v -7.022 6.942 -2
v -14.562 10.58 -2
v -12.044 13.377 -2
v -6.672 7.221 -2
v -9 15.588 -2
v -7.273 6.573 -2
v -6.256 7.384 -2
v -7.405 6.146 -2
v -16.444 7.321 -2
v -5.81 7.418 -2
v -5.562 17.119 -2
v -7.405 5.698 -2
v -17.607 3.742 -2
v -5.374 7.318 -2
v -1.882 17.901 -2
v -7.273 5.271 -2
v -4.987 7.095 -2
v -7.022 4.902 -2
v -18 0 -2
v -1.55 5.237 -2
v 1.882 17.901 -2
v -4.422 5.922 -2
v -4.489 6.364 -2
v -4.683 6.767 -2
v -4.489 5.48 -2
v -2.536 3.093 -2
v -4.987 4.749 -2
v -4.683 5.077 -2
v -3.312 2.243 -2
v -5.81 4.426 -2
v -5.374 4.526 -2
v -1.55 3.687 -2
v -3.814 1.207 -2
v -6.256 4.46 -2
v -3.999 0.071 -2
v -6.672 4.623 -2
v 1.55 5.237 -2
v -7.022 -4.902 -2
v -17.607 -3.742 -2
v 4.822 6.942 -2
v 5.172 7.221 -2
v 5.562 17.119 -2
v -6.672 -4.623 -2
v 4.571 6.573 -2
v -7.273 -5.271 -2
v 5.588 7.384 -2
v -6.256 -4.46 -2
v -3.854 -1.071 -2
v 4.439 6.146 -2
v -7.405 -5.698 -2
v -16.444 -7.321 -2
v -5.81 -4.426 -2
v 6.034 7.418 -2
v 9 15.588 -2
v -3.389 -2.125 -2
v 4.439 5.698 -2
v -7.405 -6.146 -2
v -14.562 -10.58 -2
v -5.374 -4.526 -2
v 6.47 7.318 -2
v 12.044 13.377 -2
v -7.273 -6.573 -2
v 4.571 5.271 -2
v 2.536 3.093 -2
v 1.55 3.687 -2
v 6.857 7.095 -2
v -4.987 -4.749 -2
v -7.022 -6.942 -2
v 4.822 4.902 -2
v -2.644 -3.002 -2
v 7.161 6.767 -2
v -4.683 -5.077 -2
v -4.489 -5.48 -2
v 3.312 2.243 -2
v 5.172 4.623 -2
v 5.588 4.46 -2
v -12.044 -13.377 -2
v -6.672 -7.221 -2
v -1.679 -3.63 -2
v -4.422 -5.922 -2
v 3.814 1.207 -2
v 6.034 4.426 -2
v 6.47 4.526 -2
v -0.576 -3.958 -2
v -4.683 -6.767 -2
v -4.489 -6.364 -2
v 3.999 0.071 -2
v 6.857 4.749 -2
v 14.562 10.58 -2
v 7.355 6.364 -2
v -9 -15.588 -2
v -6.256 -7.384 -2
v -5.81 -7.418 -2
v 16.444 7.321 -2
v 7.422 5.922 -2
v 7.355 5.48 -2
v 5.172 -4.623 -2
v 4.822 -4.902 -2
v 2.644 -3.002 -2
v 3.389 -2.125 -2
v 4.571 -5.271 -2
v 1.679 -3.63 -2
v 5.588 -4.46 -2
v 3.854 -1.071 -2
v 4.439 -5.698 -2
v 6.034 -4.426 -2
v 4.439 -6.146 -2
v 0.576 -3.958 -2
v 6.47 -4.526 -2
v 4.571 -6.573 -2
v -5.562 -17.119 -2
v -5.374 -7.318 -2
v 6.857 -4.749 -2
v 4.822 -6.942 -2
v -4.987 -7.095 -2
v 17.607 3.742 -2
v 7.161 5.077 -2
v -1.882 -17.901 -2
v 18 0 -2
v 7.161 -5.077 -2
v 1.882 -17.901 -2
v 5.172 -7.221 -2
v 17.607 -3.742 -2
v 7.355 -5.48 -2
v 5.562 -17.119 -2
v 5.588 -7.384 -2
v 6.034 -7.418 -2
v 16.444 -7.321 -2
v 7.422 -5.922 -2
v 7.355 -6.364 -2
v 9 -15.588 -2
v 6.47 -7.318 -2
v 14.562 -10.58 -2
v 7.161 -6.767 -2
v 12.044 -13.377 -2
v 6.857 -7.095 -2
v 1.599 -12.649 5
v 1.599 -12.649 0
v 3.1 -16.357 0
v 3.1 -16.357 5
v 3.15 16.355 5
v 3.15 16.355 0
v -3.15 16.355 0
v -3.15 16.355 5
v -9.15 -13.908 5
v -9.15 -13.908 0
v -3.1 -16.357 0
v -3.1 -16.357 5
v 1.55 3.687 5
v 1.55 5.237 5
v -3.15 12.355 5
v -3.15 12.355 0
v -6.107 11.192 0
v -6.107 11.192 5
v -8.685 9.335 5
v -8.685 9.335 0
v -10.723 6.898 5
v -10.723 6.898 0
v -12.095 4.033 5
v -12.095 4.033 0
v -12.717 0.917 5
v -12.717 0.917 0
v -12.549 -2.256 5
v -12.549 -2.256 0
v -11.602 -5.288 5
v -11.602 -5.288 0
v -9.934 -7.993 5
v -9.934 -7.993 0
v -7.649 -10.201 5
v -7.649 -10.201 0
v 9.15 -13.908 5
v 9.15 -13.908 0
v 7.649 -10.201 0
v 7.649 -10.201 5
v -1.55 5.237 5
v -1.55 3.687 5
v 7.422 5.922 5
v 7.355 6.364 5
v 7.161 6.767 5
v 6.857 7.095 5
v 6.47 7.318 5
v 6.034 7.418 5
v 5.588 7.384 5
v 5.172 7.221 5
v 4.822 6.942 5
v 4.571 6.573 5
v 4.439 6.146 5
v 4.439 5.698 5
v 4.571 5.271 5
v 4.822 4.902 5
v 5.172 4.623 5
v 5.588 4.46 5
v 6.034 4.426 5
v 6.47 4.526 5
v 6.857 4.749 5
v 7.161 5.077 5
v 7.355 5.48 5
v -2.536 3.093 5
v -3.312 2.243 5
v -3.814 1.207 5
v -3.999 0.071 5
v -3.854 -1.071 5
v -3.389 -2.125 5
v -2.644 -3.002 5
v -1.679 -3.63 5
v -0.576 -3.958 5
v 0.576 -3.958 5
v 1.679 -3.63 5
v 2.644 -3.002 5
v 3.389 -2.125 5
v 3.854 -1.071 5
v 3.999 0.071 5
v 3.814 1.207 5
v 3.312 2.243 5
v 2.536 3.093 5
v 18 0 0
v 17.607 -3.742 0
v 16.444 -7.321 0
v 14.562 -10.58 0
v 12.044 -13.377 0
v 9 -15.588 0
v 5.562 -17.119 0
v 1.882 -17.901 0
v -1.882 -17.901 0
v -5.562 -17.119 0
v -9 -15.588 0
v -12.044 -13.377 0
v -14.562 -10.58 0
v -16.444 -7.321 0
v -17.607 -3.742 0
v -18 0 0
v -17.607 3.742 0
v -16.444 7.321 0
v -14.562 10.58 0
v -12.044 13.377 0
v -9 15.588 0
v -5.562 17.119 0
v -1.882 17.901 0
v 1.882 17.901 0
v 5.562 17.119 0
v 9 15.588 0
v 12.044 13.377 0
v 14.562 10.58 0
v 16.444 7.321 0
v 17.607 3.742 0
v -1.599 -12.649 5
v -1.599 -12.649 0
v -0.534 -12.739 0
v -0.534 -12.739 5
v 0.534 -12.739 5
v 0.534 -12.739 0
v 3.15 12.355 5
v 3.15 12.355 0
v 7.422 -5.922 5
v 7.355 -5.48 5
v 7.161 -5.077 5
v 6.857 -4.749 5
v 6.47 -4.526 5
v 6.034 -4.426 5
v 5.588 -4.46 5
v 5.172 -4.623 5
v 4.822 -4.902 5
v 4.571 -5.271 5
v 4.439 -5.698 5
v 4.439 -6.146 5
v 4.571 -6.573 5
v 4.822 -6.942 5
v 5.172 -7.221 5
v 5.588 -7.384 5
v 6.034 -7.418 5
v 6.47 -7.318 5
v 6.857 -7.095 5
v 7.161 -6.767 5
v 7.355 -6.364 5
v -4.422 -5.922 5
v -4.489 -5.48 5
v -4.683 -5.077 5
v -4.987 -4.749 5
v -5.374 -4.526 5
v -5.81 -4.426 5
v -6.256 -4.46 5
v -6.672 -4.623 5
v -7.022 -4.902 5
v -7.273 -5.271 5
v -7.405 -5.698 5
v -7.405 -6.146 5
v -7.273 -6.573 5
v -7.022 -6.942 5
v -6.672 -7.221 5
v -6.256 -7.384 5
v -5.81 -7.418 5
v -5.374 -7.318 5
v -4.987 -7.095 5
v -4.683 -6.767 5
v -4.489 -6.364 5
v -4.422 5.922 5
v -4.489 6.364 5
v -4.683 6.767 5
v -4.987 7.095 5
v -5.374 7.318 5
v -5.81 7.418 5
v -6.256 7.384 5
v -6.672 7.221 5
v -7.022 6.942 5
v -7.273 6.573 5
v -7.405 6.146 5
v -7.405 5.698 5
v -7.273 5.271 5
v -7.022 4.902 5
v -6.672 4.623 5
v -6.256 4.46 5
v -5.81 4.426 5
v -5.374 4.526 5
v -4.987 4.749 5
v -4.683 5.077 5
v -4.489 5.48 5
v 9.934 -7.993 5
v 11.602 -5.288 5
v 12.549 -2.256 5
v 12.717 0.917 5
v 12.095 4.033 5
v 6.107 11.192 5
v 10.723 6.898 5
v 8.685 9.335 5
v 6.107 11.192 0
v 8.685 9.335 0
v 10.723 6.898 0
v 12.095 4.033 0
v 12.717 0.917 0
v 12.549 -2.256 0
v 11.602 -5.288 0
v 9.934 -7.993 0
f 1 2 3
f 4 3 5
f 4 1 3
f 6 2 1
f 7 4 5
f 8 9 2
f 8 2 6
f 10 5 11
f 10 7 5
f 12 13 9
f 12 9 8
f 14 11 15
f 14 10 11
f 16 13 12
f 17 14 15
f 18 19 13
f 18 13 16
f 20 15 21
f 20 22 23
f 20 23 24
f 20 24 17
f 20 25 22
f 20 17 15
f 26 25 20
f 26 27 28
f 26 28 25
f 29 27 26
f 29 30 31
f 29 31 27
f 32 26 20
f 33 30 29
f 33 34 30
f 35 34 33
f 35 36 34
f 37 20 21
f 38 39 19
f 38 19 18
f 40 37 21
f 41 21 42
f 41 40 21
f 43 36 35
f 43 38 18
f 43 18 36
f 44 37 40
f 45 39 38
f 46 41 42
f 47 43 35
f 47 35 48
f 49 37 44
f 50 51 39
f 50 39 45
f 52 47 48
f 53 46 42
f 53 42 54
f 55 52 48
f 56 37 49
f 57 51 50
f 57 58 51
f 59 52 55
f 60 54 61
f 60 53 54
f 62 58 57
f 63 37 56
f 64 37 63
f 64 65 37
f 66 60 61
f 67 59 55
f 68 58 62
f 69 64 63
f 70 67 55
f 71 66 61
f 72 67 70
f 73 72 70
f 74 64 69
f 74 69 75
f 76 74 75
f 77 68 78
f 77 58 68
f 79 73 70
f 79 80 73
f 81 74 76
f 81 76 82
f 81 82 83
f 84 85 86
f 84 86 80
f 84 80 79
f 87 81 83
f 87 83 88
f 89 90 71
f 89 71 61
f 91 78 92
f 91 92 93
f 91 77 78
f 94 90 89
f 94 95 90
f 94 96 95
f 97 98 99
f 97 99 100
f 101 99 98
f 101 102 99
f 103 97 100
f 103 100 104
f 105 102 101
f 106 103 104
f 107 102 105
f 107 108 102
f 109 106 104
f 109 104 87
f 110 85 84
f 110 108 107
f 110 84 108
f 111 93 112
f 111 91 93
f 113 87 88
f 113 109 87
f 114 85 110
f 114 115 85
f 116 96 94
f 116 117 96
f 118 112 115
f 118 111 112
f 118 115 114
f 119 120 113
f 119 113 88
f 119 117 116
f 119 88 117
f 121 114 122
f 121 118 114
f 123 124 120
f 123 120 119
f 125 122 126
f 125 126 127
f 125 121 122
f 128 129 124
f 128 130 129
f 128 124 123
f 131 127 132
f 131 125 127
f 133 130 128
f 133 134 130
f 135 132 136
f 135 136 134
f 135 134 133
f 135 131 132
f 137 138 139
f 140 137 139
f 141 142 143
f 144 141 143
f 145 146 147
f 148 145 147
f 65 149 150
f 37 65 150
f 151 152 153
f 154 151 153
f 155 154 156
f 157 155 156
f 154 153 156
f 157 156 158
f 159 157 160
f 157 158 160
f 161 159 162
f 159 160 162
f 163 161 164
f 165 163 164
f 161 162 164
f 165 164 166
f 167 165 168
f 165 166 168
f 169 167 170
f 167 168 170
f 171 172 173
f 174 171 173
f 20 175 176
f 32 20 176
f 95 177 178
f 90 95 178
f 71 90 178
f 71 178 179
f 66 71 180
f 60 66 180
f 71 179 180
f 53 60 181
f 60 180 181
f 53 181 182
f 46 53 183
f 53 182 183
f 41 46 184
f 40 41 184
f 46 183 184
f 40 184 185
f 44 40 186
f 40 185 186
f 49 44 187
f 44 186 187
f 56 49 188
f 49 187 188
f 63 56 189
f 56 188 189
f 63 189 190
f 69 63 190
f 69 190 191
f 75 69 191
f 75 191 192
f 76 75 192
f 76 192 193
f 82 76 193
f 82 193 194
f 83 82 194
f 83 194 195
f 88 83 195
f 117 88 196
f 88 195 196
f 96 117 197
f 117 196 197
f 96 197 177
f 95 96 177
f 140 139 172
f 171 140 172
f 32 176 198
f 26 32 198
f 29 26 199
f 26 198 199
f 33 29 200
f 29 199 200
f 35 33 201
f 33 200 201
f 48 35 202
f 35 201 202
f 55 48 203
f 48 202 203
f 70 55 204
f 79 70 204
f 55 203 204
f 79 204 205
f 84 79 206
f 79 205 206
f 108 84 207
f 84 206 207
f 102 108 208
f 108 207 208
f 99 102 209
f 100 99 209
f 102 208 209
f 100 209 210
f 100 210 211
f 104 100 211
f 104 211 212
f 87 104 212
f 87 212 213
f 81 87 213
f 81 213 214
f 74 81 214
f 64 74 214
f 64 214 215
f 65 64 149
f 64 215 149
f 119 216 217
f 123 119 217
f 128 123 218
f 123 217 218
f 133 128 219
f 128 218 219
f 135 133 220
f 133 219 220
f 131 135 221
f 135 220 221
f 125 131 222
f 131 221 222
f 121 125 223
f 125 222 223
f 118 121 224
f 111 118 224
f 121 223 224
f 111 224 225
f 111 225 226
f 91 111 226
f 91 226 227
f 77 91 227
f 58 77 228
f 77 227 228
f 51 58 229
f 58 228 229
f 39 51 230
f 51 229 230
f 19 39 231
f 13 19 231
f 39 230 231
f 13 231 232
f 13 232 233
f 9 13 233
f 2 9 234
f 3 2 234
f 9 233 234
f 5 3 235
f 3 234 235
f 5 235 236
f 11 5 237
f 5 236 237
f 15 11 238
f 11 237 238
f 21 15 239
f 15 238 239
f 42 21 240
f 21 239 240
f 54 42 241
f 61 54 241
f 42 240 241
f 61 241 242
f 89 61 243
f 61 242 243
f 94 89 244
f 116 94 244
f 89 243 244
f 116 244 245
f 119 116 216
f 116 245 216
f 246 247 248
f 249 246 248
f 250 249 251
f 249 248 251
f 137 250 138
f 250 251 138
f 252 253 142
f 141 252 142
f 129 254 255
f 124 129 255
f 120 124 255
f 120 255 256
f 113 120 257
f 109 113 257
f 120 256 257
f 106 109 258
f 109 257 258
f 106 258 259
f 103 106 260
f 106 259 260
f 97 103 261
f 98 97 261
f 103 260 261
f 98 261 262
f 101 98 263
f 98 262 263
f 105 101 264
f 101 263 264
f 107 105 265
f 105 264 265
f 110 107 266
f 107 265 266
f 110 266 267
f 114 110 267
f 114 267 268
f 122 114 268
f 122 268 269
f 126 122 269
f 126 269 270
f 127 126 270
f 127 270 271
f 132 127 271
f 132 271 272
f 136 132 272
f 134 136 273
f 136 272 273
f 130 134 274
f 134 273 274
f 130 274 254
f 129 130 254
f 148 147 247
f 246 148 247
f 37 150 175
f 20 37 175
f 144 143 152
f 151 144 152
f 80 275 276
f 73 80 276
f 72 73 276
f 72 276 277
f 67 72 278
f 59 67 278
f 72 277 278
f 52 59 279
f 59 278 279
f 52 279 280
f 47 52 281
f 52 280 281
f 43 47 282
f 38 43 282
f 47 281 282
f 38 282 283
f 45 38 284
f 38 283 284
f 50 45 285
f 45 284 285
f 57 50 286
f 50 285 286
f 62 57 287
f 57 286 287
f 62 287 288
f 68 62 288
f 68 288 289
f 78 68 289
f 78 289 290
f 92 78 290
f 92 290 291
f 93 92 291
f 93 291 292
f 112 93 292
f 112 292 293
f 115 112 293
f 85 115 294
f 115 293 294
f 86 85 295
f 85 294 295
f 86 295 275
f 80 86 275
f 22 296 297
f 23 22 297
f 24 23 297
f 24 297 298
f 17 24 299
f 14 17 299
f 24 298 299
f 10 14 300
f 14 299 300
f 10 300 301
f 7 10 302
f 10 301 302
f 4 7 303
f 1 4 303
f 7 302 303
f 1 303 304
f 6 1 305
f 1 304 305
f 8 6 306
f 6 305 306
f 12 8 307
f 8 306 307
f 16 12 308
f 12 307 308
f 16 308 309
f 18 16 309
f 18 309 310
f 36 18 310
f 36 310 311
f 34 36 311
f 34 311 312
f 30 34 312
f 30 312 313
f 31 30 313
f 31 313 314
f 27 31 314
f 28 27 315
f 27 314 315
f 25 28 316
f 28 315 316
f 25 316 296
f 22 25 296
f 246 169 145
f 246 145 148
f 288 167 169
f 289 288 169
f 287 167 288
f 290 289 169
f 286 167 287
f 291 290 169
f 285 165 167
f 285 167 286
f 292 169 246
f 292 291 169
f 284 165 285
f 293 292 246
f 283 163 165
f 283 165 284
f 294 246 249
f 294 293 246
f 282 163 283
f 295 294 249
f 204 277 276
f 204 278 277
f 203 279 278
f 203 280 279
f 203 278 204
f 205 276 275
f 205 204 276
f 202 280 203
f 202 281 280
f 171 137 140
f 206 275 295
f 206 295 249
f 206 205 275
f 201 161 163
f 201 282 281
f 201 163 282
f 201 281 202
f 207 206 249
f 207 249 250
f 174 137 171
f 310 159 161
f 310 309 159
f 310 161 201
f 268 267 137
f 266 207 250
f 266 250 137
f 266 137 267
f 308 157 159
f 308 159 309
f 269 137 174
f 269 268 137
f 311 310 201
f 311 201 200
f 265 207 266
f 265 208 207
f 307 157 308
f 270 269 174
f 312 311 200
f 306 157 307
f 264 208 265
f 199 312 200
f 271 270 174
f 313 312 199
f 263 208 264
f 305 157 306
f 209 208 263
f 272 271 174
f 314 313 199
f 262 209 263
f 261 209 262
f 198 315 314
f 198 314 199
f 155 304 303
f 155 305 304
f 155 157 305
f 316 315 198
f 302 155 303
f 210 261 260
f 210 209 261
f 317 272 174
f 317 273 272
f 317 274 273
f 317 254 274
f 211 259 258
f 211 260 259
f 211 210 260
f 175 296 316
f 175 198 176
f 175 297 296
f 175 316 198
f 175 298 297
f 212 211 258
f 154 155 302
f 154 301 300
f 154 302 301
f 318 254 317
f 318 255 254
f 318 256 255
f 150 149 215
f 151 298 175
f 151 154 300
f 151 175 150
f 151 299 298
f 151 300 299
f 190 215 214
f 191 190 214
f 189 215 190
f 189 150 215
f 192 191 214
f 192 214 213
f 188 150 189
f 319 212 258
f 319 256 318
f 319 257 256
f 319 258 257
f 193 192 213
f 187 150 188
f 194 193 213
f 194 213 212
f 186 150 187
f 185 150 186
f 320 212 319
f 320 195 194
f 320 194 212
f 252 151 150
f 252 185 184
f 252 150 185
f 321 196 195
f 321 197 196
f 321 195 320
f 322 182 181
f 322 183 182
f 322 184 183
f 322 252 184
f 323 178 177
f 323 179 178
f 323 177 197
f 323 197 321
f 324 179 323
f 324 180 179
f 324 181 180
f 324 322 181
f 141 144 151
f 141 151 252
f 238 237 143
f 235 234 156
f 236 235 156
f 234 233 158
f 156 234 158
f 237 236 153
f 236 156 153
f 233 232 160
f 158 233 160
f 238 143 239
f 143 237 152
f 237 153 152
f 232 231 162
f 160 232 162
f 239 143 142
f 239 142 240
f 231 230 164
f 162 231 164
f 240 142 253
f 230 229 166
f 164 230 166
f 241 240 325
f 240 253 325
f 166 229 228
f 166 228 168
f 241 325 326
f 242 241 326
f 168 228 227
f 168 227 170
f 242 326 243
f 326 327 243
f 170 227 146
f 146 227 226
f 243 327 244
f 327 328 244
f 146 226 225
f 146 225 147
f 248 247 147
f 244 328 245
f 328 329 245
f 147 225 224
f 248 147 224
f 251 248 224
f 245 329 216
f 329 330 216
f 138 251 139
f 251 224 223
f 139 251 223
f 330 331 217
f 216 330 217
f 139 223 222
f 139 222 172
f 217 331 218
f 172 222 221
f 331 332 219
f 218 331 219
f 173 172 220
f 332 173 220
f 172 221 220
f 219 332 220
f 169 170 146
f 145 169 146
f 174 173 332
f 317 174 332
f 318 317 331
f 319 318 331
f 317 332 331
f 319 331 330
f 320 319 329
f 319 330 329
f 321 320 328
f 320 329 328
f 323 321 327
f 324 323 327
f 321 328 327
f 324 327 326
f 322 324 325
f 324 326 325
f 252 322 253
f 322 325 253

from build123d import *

# Parameters (mm, degrees)
F1_DEPTH = 5
F2_R     = 18
F3_DEPTH = 2
F4_R     = 1.5
F5_DEPTH = 7


with BuildPart() as f1:
    # F0 (on Top) → F1 (new body)
    with BuildSketch(Plane.XY):
        with BuildLine():
            Line((9.15, -13.908354), (7.649261, -10.200554))
            ThreePointArc((7.649261, -10.200554), (12.50366, 2.49419), (3.15, 12.354756))
            Line((3.15, 12.354756), (3.15, 16.354756))
            Line((3.15, 16.354756), (0, 16.354756))
            Line((0, 16.354756), (-3.15, 16.354756))
            Line((-3.15, 16.354756), (-3.15, 12.354756))
            ThreePointArc((-3.15, 12.354756), (-12.50366, 2.49419), (-7.649261, -10.200554))
            Line((-7.649261, -10.200554), (-9.15, -13.908354))
            Line((-9.15, -13.908354), (-3.1, -16.357103))
            Line((-3.1, -16.357103), (-1.599261, -12.649303))
            ThreePointArc((-1.599261, -12.649303), (0, -12.75), (1.599261, -12.649303))
            Line((1.599261, -12.649303), (3.1, -16.357103))
            Line((3.1, -16.357103), (9.15, -13.908354))
        make_face()
    extrude(amount=F1_DEPTH)

    # F2 (on face) → F3 (join)
    with BuildSketch(Plane(origin=(0, 0, 0), x_dir=(1, 0, 0), z_dir=(0, 0, -1))):
        Circle(F2_R)
    extrude(amount=F3_DEPTH)

    # F4 (on face) → F5 (cut, through all)
    with BuildSketch(Plane.XY.offset(5)):
        with BuildLine():
            Line((-1.55, 5.237479), (-1.55, 3.687479))
            ThreePointArc((-1.55, 3.687479), (0, -4), (1.55, 3.687479))
            Line((1.55, 3.687479), (1.55, 5.237479))
            Line((1.55, 5.237479), (0, 5.237479))
            Line((0, 5.237479), (-1.55, 5.237479))
        make_face()
        with Locations((-5.922019, 5.922019)):
            Circle(F4_R)
        with Locations((-5.922019, -5.922019)):
            Circle(F4_R)
        with Locations((5.922019, -5.922019)):
            Circle(F4_R)
        with Locations((5.922019, 5.922019)):
            Circle(F4_R)
    extrude(amount=-F5_DEPTH, mode=Mode.SUBTRACT)


solid = f1.part
